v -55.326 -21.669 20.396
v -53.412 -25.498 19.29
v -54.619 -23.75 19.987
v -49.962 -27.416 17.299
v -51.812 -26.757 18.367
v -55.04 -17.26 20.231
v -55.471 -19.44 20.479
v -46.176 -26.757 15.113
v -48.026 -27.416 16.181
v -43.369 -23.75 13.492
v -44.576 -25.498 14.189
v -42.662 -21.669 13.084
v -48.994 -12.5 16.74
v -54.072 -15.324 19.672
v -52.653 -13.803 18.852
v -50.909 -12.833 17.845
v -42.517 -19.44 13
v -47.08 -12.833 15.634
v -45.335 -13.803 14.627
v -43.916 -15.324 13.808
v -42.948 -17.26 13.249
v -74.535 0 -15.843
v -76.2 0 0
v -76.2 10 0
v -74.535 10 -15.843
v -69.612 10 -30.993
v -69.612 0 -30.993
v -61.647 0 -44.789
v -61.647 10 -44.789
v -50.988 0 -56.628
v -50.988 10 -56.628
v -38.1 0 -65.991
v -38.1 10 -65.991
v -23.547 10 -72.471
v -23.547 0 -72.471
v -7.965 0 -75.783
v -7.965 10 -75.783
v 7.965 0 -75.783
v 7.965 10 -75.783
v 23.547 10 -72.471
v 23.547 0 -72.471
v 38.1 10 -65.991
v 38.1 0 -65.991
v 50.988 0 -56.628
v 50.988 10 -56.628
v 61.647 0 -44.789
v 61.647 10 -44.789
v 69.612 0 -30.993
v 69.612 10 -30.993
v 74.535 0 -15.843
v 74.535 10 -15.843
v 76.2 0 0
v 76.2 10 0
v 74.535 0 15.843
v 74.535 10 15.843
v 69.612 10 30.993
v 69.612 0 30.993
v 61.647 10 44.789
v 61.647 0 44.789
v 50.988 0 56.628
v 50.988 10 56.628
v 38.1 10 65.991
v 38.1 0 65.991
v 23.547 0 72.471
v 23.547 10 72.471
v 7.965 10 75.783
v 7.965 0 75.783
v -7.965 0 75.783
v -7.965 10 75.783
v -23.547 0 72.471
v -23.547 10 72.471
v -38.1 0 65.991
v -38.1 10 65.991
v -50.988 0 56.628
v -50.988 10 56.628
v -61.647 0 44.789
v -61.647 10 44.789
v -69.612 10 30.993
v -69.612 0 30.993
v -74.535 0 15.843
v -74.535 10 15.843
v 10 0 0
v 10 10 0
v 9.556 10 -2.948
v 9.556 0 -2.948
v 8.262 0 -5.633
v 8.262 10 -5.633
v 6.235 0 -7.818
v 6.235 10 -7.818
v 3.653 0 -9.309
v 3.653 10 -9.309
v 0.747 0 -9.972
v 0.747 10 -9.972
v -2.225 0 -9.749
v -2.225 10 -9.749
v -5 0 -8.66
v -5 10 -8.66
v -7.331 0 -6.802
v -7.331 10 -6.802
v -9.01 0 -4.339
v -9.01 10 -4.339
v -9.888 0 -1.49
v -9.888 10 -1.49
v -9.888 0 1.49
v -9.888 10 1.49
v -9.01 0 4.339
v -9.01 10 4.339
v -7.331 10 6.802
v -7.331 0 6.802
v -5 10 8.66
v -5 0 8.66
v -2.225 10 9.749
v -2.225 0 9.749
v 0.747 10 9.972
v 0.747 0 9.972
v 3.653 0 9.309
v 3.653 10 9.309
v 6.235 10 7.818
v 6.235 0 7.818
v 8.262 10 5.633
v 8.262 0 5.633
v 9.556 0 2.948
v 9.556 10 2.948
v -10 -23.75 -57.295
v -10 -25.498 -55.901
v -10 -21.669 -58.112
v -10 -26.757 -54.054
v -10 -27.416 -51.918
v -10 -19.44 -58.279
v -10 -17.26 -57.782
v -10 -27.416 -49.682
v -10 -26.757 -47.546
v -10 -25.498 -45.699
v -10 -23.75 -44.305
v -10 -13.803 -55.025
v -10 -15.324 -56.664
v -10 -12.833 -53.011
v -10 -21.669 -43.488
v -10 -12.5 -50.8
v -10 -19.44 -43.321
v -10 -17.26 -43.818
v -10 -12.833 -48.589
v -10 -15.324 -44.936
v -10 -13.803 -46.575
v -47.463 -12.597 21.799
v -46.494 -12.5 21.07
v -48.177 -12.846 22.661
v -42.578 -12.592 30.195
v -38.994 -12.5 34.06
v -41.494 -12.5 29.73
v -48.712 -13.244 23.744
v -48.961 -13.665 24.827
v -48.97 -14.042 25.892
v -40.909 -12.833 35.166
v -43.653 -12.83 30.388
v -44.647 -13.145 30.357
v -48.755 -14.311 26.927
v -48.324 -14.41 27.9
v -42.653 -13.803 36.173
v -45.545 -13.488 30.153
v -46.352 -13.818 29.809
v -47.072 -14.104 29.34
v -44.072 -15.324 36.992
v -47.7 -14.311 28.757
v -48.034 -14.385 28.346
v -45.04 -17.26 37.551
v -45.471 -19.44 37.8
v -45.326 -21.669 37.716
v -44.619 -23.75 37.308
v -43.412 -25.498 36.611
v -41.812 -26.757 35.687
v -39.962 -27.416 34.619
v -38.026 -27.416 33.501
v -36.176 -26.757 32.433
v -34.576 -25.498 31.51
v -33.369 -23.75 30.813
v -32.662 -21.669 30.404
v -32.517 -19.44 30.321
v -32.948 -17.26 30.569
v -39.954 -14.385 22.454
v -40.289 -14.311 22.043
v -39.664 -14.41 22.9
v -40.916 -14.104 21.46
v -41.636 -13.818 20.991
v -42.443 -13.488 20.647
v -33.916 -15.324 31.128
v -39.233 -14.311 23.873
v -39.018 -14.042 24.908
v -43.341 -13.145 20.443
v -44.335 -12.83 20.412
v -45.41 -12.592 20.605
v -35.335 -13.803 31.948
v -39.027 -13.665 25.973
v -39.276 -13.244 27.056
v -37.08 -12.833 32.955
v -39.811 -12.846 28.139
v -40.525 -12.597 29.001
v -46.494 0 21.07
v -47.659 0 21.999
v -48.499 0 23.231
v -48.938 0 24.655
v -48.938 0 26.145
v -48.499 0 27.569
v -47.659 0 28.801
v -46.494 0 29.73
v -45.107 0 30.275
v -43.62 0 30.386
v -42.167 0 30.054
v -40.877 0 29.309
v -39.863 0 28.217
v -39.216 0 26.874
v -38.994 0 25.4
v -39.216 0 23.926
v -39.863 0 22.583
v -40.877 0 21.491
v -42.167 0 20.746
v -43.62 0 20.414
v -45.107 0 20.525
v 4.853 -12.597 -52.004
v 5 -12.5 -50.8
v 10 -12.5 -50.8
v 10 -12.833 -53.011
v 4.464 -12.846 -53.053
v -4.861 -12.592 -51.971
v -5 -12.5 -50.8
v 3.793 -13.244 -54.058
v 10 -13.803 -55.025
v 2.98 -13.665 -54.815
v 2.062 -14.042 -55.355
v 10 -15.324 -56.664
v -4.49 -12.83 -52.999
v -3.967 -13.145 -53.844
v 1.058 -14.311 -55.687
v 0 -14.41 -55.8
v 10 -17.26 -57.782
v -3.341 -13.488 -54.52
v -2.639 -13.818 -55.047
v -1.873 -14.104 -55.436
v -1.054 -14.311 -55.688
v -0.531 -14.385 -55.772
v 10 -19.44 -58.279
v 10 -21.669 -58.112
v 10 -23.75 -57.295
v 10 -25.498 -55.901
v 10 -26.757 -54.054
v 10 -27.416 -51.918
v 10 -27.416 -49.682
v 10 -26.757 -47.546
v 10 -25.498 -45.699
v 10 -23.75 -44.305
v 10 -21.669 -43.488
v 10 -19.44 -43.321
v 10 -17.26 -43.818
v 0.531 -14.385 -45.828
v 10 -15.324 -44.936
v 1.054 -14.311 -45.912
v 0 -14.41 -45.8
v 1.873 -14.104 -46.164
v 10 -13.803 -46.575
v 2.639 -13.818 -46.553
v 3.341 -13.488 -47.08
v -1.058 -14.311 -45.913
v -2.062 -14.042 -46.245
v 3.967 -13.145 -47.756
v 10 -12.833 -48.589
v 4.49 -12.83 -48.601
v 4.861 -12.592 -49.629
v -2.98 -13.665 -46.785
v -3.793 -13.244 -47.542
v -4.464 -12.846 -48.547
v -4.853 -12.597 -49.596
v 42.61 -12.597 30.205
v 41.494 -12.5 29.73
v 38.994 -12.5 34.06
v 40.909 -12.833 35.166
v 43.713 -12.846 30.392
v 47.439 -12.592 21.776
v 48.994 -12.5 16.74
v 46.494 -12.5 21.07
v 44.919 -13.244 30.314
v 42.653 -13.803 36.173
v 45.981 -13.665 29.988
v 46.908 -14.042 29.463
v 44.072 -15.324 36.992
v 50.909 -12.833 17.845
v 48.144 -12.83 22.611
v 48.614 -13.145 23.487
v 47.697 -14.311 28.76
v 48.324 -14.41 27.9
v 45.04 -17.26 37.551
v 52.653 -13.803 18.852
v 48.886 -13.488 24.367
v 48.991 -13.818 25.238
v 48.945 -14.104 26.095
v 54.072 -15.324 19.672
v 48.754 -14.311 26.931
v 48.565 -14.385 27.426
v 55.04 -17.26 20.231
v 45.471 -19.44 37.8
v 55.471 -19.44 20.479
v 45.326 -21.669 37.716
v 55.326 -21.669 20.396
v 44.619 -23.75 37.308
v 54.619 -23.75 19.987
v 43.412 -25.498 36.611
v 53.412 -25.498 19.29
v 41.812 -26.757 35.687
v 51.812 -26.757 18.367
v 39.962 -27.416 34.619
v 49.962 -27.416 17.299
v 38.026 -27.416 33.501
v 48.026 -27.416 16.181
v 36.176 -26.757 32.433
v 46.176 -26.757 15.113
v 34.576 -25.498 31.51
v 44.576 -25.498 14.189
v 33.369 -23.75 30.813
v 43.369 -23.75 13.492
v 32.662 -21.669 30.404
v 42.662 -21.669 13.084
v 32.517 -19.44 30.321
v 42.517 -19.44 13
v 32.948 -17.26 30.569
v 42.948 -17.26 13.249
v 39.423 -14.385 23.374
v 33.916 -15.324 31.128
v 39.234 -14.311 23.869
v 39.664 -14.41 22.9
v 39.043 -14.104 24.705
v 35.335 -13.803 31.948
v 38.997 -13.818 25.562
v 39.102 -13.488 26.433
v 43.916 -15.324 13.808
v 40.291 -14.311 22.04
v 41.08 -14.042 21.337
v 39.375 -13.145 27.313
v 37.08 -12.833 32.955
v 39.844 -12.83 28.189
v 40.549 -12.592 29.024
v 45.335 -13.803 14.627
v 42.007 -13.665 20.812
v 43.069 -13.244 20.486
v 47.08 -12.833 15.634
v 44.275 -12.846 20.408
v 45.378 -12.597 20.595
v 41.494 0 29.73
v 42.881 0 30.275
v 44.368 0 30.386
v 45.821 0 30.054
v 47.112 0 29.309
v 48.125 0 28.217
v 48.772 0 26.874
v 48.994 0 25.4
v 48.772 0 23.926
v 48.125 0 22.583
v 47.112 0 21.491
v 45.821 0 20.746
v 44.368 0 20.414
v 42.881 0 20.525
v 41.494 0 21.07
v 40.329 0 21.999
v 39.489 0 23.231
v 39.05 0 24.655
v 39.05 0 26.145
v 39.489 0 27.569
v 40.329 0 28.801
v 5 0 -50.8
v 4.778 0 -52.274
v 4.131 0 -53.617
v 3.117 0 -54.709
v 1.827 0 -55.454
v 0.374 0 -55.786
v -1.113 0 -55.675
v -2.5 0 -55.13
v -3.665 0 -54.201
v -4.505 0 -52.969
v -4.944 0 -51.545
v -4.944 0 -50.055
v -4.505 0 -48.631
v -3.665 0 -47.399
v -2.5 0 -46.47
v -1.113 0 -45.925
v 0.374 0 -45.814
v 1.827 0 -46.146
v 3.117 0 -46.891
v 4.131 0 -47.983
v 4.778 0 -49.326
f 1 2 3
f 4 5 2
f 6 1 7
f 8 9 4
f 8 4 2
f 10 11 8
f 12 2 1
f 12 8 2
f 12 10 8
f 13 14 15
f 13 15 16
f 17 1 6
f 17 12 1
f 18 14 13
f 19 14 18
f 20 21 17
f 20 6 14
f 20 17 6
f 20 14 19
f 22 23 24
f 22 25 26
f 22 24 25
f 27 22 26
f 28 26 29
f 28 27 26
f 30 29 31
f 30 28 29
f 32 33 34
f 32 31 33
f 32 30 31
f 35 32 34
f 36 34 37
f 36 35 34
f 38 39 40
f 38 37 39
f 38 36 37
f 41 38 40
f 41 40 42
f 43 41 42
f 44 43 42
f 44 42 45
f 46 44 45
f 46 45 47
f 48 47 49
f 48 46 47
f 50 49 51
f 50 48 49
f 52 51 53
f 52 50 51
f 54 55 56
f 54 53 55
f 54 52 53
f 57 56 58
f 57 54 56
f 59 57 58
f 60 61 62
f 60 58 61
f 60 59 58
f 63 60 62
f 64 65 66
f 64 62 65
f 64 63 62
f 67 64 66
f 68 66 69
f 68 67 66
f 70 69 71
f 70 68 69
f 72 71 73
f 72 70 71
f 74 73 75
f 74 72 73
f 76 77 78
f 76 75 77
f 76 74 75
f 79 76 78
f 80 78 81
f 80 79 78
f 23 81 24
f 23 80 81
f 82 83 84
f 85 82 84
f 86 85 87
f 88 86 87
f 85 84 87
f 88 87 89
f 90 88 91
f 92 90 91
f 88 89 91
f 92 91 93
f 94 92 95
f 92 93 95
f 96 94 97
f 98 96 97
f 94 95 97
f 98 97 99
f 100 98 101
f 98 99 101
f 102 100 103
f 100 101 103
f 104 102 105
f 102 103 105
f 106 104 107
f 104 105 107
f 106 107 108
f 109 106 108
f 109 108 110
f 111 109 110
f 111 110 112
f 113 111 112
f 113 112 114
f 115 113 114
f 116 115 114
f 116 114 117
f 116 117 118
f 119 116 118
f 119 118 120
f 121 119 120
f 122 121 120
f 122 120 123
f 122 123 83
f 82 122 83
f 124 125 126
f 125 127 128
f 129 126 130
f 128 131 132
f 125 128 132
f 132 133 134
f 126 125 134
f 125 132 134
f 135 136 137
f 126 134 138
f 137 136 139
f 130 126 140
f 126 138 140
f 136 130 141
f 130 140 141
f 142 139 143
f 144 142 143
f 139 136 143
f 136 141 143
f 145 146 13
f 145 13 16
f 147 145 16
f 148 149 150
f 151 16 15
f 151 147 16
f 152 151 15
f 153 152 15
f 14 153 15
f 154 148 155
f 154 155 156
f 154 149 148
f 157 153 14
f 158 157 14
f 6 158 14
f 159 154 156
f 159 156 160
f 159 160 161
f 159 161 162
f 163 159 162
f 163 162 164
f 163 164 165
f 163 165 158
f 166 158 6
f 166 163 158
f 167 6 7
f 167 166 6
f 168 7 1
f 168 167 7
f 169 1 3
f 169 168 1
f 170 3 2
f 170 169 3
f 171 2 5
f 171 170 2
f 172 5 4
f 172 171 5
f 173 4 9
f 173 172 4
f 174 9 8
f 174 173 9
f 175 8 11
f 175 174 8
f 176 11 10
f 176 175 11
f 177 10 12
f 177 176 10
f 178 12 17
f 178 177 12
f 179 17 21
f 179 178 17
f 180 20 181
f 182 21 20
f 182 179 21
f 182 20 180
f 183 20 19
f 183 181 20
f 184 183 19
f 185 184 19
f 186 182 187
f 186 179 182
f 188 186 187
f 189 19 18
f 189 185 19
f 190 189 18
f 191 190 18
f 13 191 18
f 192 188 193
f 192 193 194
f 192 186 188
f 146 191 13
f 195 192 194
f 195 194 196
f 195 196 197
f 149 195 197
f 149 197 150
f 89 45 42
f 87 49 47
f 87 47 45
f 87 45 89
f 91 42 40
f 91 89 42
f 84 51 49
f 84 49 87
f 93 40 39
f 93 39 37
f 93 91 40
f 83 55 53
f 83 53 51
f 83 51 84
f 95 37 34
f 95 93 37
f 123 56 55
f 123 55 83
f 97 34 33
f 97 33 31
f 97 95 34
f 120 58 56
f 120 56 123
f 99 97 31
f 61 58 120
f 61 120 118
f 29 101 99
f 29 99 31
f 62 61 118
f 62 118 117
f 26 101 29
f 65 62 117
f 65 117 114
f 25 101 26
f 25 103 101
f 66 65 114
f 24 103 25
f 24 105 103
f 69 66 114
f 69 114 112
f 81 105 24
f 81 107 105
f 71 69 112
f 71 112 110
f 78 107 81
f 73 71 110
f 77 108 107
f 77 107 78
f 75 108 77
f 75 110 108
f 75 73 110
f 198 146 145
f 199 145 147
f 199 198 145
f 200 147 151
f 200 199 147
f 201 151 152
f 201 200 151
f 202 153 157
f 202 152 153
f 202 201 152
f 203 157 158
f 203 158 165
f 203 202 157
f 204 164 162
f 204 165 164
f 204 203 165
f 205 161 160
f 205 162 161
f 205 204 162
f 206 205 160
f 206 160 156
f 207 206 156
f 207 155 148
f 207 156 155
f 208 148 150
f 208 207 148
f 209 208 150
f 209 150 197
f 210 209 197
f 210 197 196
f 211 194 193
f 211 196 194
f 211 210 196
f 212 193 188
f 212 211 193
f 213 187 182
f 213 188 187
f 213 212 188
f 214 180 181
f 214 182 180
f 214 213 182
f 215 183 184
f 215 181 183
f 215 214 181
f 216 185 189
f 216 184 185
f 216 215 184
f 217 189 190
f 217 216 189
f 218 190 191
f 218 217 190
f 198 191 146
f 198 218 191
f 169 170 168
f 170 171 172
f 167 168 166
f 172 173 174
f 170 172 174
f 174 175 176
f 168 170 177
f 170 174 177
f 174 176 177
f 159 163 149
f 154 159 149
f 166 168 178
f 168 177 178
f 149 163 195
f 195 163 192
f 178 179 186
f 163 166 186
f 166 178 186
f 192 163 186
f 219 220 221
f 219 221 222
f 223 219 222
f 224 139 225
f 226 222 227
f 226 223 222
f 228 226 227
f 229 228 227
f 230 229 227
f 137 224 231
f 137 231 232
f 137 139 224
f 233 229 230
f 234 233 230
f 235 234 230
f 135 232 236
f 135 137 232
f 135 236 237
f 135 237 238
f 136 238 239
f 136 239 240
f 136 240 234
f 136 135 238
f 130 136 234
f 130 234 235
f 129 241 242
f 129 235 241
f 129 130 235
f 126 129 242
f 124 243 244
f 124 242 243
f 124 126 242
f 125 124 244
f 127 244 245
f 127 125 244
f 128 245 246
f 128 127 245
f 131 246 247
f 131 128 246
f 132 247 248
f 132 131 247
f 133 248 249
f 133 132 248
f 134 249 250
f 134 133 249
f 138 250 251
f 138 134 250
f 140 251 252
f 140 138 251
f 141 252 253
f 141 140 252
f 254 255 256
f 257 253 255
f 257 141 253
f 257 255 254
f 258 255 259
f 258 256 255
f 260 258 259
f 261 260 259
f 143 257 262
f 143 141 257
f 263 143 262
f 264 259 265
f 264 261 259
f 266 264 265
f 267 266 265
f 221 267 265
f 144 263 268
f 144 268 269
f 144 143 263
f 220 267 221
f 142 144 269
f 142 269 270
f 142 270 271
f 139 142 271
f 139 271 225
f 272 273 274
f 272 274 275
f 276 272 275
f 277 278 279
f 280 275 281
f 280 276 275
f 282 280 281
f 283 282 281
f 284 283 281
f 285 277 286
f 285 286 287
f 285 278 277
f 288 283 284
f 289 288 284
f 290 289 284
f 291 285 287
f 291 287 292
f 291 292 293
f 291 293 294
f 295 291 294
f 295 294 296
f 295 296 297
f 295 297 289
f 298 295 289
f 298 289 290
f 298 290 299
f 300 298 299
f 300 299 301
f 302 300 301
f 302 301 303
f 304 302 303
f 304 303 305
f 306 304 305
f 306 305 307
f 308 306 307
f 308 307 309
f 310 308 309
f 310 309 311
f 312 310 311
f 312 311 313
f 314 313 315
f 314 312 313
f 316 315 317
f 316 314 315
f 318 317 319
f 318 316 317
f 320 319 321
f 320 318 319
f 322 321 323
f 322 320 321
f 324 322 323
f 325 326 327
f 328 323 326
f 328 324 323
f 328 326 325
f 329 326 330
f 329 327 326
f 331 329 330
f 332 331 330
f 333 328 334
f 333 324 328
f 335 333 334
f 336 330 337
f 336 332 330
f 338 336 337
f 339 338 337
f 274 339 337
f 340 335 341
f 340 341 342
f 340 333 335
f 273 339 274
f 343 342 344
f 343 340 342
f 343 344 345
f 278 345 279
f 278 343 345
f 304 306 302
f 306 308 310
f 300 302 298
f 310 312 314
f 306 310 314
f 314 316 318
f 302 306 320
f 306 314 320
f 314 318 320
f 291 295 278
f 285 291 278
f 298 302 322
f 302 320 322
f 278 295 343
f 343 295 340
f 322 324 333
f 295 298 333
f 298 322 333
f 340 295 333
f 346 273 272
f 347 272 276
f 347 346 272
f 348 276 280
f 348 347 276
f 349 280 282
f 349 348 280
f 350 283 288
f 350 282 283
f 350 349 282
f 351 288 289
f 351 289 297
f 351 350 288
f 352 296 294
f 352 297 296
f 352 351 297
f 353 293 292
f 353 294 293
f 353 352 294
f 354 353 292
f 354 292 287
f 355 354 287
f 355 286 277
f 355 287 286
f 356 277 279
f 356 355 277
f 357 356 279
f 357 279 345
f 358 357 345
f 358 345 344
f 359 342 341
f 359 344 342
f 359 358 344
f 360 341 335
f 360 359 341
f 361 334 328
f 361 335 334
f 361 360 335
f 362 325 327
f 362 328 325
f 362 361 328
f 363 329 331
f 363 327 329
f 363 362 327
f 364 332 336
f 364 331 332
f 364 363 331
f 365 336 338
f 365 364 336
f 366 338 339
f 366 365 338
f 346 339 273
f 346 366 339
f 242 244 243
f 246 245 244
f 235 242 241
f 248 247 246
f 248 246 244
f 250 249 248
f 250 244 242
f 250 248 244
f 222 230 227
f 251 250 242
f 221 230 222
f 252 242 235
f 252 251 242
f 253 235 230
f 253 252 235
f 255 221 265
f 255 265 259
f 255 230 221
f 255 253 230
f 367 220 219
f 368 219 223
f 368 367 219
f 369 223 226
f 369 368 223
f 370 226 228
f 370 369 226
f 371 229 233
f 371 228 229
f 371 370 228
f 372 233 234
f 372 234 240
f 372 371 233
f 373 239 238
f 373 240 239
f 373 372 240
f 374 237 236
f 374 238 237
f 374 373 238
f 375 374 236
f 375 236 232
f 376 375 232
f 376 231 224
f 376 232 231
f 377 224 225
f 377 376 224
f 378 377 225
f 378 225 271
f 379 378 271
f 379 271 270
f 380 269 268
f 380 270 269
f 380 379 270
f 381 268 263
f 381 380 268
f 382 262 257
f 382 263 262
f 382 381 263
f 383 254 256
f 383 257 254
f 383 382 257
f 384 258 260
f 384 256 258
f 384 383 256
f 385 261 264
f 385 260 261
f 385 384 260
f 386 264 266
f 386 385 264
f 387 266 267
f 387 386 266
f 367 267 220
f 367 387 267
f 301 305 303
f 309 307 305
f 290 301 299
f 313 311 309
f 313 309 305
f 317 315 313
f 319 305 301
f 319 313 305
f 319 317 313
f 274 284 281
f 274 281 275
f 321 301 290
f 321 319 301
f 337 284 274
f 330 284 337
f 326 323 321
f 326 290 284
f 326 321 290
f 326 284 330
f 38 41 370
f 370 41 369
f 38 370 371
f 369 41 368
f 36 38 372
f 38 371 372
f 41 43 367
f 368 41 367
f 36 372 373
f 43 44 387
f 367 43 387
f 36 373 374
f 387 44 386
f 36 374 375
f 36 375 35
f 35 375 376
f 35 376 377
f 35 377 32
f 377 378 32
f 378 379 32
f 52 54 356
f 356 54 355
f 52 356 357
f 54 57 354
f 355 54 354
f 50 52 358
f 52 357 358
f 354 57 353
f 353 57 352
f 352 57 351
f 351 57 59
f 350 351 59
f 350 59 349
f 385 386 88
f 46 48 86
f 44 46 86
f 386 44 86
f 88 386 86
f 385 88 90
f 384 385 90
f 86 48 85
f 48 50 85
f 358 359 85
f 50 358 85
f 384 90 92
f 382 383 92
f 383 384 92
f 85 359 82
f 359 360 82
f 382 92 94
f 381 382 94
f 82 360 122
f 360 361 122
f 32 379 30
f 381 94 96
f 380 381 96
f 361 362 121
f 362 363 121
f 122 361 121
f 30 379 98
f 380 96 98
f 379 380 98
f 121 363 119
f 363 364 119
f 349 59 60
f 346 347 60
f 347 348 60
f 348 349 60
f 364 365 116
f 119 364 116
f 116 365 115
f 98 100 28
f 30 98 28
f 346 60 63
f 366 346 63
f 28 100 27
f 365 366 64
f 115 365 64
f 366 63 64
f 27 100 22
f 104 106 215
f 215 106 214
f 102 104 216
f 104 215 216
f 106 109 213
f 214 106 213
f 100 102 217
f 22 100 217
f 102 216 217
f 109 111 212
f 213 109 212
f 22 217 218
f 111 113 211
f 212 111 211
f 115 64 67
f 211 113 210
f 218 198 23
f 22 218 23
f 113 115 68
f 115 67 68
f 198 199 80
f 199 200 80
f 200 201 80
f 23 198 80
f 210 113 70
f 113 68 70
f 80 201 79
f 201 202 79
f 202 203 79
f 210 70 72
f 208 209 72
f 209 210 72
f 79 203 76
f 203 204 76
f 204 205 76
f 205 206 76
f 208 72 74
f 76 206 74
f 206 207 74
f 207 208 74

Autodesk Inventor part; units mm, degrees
ref_plane "YZ Plane" through (0, 0, 0) normal (1, 0, 0) x (0, 1, 0)
ref_plane "XZ Plane" through (0, 0, 0) normal (0, 1, 0) x (-1, 0, 0)
ref_plane "XY Plane" through (0, 0, 0) normal (0, 0, 1) x (1, 0, 0)
sketch "Sketch1" plane through (0, 0, 0) normal (0, 1, 0) x (-1, 0, 0)
  circle A0 centre (0, 0) radius 76.2
  dimension "d0" = 152.4
extrude "Extrusion1" add sketch "Sketch1" along normal blind 10
sketch "Sketch2" plane through (0, 0, 0) normal (0, -1, 0) x (1, 0, 0)
  circle A0 centre (0, -50.8) radius 5
  line L0 (0, 0) -> (0, -50.8)
  dimension "d3" = 50.8
  dimension "d4" = 10
extrude "Extrusion2" add sketch "Sketch2" along normal blind 20
pattern_circular "Circular Pattern1" count 3 over 360 about axis through (0, -10, 0) along (0, 1, 0) of "Extrusion2"
sketch "Sketch4" plane through (0, 10, 0) normal (0, 1, 0) x (1, 0, 0)
  circle A0 centre (0, 0) radius 10
  dimension "d12" = 20
extrude "Extrusion3" cut sketch "Sketch4" against normal up to surface (10 mm away)
sketch "Sketch5" plane through (0, 0, 0) normal (1, 0, 0) x (0, 1, 0)
  line L0 (-20, -45.8) -> (-20, -55.8) projected
  circle A0 centre (-20, -50.8) radius 7.5
  point P0 (0, 0)
  dimension "d15" = 15
extrude "Extrusion4" add sketch "Sketch5" along normal mid plane 20
pattern_circular "Circular Pattern2" count 3 over 360 about axis through (0, 0, 0) along (0, 1, 0) of "Extrusion4"
properties part number "pll-base"
